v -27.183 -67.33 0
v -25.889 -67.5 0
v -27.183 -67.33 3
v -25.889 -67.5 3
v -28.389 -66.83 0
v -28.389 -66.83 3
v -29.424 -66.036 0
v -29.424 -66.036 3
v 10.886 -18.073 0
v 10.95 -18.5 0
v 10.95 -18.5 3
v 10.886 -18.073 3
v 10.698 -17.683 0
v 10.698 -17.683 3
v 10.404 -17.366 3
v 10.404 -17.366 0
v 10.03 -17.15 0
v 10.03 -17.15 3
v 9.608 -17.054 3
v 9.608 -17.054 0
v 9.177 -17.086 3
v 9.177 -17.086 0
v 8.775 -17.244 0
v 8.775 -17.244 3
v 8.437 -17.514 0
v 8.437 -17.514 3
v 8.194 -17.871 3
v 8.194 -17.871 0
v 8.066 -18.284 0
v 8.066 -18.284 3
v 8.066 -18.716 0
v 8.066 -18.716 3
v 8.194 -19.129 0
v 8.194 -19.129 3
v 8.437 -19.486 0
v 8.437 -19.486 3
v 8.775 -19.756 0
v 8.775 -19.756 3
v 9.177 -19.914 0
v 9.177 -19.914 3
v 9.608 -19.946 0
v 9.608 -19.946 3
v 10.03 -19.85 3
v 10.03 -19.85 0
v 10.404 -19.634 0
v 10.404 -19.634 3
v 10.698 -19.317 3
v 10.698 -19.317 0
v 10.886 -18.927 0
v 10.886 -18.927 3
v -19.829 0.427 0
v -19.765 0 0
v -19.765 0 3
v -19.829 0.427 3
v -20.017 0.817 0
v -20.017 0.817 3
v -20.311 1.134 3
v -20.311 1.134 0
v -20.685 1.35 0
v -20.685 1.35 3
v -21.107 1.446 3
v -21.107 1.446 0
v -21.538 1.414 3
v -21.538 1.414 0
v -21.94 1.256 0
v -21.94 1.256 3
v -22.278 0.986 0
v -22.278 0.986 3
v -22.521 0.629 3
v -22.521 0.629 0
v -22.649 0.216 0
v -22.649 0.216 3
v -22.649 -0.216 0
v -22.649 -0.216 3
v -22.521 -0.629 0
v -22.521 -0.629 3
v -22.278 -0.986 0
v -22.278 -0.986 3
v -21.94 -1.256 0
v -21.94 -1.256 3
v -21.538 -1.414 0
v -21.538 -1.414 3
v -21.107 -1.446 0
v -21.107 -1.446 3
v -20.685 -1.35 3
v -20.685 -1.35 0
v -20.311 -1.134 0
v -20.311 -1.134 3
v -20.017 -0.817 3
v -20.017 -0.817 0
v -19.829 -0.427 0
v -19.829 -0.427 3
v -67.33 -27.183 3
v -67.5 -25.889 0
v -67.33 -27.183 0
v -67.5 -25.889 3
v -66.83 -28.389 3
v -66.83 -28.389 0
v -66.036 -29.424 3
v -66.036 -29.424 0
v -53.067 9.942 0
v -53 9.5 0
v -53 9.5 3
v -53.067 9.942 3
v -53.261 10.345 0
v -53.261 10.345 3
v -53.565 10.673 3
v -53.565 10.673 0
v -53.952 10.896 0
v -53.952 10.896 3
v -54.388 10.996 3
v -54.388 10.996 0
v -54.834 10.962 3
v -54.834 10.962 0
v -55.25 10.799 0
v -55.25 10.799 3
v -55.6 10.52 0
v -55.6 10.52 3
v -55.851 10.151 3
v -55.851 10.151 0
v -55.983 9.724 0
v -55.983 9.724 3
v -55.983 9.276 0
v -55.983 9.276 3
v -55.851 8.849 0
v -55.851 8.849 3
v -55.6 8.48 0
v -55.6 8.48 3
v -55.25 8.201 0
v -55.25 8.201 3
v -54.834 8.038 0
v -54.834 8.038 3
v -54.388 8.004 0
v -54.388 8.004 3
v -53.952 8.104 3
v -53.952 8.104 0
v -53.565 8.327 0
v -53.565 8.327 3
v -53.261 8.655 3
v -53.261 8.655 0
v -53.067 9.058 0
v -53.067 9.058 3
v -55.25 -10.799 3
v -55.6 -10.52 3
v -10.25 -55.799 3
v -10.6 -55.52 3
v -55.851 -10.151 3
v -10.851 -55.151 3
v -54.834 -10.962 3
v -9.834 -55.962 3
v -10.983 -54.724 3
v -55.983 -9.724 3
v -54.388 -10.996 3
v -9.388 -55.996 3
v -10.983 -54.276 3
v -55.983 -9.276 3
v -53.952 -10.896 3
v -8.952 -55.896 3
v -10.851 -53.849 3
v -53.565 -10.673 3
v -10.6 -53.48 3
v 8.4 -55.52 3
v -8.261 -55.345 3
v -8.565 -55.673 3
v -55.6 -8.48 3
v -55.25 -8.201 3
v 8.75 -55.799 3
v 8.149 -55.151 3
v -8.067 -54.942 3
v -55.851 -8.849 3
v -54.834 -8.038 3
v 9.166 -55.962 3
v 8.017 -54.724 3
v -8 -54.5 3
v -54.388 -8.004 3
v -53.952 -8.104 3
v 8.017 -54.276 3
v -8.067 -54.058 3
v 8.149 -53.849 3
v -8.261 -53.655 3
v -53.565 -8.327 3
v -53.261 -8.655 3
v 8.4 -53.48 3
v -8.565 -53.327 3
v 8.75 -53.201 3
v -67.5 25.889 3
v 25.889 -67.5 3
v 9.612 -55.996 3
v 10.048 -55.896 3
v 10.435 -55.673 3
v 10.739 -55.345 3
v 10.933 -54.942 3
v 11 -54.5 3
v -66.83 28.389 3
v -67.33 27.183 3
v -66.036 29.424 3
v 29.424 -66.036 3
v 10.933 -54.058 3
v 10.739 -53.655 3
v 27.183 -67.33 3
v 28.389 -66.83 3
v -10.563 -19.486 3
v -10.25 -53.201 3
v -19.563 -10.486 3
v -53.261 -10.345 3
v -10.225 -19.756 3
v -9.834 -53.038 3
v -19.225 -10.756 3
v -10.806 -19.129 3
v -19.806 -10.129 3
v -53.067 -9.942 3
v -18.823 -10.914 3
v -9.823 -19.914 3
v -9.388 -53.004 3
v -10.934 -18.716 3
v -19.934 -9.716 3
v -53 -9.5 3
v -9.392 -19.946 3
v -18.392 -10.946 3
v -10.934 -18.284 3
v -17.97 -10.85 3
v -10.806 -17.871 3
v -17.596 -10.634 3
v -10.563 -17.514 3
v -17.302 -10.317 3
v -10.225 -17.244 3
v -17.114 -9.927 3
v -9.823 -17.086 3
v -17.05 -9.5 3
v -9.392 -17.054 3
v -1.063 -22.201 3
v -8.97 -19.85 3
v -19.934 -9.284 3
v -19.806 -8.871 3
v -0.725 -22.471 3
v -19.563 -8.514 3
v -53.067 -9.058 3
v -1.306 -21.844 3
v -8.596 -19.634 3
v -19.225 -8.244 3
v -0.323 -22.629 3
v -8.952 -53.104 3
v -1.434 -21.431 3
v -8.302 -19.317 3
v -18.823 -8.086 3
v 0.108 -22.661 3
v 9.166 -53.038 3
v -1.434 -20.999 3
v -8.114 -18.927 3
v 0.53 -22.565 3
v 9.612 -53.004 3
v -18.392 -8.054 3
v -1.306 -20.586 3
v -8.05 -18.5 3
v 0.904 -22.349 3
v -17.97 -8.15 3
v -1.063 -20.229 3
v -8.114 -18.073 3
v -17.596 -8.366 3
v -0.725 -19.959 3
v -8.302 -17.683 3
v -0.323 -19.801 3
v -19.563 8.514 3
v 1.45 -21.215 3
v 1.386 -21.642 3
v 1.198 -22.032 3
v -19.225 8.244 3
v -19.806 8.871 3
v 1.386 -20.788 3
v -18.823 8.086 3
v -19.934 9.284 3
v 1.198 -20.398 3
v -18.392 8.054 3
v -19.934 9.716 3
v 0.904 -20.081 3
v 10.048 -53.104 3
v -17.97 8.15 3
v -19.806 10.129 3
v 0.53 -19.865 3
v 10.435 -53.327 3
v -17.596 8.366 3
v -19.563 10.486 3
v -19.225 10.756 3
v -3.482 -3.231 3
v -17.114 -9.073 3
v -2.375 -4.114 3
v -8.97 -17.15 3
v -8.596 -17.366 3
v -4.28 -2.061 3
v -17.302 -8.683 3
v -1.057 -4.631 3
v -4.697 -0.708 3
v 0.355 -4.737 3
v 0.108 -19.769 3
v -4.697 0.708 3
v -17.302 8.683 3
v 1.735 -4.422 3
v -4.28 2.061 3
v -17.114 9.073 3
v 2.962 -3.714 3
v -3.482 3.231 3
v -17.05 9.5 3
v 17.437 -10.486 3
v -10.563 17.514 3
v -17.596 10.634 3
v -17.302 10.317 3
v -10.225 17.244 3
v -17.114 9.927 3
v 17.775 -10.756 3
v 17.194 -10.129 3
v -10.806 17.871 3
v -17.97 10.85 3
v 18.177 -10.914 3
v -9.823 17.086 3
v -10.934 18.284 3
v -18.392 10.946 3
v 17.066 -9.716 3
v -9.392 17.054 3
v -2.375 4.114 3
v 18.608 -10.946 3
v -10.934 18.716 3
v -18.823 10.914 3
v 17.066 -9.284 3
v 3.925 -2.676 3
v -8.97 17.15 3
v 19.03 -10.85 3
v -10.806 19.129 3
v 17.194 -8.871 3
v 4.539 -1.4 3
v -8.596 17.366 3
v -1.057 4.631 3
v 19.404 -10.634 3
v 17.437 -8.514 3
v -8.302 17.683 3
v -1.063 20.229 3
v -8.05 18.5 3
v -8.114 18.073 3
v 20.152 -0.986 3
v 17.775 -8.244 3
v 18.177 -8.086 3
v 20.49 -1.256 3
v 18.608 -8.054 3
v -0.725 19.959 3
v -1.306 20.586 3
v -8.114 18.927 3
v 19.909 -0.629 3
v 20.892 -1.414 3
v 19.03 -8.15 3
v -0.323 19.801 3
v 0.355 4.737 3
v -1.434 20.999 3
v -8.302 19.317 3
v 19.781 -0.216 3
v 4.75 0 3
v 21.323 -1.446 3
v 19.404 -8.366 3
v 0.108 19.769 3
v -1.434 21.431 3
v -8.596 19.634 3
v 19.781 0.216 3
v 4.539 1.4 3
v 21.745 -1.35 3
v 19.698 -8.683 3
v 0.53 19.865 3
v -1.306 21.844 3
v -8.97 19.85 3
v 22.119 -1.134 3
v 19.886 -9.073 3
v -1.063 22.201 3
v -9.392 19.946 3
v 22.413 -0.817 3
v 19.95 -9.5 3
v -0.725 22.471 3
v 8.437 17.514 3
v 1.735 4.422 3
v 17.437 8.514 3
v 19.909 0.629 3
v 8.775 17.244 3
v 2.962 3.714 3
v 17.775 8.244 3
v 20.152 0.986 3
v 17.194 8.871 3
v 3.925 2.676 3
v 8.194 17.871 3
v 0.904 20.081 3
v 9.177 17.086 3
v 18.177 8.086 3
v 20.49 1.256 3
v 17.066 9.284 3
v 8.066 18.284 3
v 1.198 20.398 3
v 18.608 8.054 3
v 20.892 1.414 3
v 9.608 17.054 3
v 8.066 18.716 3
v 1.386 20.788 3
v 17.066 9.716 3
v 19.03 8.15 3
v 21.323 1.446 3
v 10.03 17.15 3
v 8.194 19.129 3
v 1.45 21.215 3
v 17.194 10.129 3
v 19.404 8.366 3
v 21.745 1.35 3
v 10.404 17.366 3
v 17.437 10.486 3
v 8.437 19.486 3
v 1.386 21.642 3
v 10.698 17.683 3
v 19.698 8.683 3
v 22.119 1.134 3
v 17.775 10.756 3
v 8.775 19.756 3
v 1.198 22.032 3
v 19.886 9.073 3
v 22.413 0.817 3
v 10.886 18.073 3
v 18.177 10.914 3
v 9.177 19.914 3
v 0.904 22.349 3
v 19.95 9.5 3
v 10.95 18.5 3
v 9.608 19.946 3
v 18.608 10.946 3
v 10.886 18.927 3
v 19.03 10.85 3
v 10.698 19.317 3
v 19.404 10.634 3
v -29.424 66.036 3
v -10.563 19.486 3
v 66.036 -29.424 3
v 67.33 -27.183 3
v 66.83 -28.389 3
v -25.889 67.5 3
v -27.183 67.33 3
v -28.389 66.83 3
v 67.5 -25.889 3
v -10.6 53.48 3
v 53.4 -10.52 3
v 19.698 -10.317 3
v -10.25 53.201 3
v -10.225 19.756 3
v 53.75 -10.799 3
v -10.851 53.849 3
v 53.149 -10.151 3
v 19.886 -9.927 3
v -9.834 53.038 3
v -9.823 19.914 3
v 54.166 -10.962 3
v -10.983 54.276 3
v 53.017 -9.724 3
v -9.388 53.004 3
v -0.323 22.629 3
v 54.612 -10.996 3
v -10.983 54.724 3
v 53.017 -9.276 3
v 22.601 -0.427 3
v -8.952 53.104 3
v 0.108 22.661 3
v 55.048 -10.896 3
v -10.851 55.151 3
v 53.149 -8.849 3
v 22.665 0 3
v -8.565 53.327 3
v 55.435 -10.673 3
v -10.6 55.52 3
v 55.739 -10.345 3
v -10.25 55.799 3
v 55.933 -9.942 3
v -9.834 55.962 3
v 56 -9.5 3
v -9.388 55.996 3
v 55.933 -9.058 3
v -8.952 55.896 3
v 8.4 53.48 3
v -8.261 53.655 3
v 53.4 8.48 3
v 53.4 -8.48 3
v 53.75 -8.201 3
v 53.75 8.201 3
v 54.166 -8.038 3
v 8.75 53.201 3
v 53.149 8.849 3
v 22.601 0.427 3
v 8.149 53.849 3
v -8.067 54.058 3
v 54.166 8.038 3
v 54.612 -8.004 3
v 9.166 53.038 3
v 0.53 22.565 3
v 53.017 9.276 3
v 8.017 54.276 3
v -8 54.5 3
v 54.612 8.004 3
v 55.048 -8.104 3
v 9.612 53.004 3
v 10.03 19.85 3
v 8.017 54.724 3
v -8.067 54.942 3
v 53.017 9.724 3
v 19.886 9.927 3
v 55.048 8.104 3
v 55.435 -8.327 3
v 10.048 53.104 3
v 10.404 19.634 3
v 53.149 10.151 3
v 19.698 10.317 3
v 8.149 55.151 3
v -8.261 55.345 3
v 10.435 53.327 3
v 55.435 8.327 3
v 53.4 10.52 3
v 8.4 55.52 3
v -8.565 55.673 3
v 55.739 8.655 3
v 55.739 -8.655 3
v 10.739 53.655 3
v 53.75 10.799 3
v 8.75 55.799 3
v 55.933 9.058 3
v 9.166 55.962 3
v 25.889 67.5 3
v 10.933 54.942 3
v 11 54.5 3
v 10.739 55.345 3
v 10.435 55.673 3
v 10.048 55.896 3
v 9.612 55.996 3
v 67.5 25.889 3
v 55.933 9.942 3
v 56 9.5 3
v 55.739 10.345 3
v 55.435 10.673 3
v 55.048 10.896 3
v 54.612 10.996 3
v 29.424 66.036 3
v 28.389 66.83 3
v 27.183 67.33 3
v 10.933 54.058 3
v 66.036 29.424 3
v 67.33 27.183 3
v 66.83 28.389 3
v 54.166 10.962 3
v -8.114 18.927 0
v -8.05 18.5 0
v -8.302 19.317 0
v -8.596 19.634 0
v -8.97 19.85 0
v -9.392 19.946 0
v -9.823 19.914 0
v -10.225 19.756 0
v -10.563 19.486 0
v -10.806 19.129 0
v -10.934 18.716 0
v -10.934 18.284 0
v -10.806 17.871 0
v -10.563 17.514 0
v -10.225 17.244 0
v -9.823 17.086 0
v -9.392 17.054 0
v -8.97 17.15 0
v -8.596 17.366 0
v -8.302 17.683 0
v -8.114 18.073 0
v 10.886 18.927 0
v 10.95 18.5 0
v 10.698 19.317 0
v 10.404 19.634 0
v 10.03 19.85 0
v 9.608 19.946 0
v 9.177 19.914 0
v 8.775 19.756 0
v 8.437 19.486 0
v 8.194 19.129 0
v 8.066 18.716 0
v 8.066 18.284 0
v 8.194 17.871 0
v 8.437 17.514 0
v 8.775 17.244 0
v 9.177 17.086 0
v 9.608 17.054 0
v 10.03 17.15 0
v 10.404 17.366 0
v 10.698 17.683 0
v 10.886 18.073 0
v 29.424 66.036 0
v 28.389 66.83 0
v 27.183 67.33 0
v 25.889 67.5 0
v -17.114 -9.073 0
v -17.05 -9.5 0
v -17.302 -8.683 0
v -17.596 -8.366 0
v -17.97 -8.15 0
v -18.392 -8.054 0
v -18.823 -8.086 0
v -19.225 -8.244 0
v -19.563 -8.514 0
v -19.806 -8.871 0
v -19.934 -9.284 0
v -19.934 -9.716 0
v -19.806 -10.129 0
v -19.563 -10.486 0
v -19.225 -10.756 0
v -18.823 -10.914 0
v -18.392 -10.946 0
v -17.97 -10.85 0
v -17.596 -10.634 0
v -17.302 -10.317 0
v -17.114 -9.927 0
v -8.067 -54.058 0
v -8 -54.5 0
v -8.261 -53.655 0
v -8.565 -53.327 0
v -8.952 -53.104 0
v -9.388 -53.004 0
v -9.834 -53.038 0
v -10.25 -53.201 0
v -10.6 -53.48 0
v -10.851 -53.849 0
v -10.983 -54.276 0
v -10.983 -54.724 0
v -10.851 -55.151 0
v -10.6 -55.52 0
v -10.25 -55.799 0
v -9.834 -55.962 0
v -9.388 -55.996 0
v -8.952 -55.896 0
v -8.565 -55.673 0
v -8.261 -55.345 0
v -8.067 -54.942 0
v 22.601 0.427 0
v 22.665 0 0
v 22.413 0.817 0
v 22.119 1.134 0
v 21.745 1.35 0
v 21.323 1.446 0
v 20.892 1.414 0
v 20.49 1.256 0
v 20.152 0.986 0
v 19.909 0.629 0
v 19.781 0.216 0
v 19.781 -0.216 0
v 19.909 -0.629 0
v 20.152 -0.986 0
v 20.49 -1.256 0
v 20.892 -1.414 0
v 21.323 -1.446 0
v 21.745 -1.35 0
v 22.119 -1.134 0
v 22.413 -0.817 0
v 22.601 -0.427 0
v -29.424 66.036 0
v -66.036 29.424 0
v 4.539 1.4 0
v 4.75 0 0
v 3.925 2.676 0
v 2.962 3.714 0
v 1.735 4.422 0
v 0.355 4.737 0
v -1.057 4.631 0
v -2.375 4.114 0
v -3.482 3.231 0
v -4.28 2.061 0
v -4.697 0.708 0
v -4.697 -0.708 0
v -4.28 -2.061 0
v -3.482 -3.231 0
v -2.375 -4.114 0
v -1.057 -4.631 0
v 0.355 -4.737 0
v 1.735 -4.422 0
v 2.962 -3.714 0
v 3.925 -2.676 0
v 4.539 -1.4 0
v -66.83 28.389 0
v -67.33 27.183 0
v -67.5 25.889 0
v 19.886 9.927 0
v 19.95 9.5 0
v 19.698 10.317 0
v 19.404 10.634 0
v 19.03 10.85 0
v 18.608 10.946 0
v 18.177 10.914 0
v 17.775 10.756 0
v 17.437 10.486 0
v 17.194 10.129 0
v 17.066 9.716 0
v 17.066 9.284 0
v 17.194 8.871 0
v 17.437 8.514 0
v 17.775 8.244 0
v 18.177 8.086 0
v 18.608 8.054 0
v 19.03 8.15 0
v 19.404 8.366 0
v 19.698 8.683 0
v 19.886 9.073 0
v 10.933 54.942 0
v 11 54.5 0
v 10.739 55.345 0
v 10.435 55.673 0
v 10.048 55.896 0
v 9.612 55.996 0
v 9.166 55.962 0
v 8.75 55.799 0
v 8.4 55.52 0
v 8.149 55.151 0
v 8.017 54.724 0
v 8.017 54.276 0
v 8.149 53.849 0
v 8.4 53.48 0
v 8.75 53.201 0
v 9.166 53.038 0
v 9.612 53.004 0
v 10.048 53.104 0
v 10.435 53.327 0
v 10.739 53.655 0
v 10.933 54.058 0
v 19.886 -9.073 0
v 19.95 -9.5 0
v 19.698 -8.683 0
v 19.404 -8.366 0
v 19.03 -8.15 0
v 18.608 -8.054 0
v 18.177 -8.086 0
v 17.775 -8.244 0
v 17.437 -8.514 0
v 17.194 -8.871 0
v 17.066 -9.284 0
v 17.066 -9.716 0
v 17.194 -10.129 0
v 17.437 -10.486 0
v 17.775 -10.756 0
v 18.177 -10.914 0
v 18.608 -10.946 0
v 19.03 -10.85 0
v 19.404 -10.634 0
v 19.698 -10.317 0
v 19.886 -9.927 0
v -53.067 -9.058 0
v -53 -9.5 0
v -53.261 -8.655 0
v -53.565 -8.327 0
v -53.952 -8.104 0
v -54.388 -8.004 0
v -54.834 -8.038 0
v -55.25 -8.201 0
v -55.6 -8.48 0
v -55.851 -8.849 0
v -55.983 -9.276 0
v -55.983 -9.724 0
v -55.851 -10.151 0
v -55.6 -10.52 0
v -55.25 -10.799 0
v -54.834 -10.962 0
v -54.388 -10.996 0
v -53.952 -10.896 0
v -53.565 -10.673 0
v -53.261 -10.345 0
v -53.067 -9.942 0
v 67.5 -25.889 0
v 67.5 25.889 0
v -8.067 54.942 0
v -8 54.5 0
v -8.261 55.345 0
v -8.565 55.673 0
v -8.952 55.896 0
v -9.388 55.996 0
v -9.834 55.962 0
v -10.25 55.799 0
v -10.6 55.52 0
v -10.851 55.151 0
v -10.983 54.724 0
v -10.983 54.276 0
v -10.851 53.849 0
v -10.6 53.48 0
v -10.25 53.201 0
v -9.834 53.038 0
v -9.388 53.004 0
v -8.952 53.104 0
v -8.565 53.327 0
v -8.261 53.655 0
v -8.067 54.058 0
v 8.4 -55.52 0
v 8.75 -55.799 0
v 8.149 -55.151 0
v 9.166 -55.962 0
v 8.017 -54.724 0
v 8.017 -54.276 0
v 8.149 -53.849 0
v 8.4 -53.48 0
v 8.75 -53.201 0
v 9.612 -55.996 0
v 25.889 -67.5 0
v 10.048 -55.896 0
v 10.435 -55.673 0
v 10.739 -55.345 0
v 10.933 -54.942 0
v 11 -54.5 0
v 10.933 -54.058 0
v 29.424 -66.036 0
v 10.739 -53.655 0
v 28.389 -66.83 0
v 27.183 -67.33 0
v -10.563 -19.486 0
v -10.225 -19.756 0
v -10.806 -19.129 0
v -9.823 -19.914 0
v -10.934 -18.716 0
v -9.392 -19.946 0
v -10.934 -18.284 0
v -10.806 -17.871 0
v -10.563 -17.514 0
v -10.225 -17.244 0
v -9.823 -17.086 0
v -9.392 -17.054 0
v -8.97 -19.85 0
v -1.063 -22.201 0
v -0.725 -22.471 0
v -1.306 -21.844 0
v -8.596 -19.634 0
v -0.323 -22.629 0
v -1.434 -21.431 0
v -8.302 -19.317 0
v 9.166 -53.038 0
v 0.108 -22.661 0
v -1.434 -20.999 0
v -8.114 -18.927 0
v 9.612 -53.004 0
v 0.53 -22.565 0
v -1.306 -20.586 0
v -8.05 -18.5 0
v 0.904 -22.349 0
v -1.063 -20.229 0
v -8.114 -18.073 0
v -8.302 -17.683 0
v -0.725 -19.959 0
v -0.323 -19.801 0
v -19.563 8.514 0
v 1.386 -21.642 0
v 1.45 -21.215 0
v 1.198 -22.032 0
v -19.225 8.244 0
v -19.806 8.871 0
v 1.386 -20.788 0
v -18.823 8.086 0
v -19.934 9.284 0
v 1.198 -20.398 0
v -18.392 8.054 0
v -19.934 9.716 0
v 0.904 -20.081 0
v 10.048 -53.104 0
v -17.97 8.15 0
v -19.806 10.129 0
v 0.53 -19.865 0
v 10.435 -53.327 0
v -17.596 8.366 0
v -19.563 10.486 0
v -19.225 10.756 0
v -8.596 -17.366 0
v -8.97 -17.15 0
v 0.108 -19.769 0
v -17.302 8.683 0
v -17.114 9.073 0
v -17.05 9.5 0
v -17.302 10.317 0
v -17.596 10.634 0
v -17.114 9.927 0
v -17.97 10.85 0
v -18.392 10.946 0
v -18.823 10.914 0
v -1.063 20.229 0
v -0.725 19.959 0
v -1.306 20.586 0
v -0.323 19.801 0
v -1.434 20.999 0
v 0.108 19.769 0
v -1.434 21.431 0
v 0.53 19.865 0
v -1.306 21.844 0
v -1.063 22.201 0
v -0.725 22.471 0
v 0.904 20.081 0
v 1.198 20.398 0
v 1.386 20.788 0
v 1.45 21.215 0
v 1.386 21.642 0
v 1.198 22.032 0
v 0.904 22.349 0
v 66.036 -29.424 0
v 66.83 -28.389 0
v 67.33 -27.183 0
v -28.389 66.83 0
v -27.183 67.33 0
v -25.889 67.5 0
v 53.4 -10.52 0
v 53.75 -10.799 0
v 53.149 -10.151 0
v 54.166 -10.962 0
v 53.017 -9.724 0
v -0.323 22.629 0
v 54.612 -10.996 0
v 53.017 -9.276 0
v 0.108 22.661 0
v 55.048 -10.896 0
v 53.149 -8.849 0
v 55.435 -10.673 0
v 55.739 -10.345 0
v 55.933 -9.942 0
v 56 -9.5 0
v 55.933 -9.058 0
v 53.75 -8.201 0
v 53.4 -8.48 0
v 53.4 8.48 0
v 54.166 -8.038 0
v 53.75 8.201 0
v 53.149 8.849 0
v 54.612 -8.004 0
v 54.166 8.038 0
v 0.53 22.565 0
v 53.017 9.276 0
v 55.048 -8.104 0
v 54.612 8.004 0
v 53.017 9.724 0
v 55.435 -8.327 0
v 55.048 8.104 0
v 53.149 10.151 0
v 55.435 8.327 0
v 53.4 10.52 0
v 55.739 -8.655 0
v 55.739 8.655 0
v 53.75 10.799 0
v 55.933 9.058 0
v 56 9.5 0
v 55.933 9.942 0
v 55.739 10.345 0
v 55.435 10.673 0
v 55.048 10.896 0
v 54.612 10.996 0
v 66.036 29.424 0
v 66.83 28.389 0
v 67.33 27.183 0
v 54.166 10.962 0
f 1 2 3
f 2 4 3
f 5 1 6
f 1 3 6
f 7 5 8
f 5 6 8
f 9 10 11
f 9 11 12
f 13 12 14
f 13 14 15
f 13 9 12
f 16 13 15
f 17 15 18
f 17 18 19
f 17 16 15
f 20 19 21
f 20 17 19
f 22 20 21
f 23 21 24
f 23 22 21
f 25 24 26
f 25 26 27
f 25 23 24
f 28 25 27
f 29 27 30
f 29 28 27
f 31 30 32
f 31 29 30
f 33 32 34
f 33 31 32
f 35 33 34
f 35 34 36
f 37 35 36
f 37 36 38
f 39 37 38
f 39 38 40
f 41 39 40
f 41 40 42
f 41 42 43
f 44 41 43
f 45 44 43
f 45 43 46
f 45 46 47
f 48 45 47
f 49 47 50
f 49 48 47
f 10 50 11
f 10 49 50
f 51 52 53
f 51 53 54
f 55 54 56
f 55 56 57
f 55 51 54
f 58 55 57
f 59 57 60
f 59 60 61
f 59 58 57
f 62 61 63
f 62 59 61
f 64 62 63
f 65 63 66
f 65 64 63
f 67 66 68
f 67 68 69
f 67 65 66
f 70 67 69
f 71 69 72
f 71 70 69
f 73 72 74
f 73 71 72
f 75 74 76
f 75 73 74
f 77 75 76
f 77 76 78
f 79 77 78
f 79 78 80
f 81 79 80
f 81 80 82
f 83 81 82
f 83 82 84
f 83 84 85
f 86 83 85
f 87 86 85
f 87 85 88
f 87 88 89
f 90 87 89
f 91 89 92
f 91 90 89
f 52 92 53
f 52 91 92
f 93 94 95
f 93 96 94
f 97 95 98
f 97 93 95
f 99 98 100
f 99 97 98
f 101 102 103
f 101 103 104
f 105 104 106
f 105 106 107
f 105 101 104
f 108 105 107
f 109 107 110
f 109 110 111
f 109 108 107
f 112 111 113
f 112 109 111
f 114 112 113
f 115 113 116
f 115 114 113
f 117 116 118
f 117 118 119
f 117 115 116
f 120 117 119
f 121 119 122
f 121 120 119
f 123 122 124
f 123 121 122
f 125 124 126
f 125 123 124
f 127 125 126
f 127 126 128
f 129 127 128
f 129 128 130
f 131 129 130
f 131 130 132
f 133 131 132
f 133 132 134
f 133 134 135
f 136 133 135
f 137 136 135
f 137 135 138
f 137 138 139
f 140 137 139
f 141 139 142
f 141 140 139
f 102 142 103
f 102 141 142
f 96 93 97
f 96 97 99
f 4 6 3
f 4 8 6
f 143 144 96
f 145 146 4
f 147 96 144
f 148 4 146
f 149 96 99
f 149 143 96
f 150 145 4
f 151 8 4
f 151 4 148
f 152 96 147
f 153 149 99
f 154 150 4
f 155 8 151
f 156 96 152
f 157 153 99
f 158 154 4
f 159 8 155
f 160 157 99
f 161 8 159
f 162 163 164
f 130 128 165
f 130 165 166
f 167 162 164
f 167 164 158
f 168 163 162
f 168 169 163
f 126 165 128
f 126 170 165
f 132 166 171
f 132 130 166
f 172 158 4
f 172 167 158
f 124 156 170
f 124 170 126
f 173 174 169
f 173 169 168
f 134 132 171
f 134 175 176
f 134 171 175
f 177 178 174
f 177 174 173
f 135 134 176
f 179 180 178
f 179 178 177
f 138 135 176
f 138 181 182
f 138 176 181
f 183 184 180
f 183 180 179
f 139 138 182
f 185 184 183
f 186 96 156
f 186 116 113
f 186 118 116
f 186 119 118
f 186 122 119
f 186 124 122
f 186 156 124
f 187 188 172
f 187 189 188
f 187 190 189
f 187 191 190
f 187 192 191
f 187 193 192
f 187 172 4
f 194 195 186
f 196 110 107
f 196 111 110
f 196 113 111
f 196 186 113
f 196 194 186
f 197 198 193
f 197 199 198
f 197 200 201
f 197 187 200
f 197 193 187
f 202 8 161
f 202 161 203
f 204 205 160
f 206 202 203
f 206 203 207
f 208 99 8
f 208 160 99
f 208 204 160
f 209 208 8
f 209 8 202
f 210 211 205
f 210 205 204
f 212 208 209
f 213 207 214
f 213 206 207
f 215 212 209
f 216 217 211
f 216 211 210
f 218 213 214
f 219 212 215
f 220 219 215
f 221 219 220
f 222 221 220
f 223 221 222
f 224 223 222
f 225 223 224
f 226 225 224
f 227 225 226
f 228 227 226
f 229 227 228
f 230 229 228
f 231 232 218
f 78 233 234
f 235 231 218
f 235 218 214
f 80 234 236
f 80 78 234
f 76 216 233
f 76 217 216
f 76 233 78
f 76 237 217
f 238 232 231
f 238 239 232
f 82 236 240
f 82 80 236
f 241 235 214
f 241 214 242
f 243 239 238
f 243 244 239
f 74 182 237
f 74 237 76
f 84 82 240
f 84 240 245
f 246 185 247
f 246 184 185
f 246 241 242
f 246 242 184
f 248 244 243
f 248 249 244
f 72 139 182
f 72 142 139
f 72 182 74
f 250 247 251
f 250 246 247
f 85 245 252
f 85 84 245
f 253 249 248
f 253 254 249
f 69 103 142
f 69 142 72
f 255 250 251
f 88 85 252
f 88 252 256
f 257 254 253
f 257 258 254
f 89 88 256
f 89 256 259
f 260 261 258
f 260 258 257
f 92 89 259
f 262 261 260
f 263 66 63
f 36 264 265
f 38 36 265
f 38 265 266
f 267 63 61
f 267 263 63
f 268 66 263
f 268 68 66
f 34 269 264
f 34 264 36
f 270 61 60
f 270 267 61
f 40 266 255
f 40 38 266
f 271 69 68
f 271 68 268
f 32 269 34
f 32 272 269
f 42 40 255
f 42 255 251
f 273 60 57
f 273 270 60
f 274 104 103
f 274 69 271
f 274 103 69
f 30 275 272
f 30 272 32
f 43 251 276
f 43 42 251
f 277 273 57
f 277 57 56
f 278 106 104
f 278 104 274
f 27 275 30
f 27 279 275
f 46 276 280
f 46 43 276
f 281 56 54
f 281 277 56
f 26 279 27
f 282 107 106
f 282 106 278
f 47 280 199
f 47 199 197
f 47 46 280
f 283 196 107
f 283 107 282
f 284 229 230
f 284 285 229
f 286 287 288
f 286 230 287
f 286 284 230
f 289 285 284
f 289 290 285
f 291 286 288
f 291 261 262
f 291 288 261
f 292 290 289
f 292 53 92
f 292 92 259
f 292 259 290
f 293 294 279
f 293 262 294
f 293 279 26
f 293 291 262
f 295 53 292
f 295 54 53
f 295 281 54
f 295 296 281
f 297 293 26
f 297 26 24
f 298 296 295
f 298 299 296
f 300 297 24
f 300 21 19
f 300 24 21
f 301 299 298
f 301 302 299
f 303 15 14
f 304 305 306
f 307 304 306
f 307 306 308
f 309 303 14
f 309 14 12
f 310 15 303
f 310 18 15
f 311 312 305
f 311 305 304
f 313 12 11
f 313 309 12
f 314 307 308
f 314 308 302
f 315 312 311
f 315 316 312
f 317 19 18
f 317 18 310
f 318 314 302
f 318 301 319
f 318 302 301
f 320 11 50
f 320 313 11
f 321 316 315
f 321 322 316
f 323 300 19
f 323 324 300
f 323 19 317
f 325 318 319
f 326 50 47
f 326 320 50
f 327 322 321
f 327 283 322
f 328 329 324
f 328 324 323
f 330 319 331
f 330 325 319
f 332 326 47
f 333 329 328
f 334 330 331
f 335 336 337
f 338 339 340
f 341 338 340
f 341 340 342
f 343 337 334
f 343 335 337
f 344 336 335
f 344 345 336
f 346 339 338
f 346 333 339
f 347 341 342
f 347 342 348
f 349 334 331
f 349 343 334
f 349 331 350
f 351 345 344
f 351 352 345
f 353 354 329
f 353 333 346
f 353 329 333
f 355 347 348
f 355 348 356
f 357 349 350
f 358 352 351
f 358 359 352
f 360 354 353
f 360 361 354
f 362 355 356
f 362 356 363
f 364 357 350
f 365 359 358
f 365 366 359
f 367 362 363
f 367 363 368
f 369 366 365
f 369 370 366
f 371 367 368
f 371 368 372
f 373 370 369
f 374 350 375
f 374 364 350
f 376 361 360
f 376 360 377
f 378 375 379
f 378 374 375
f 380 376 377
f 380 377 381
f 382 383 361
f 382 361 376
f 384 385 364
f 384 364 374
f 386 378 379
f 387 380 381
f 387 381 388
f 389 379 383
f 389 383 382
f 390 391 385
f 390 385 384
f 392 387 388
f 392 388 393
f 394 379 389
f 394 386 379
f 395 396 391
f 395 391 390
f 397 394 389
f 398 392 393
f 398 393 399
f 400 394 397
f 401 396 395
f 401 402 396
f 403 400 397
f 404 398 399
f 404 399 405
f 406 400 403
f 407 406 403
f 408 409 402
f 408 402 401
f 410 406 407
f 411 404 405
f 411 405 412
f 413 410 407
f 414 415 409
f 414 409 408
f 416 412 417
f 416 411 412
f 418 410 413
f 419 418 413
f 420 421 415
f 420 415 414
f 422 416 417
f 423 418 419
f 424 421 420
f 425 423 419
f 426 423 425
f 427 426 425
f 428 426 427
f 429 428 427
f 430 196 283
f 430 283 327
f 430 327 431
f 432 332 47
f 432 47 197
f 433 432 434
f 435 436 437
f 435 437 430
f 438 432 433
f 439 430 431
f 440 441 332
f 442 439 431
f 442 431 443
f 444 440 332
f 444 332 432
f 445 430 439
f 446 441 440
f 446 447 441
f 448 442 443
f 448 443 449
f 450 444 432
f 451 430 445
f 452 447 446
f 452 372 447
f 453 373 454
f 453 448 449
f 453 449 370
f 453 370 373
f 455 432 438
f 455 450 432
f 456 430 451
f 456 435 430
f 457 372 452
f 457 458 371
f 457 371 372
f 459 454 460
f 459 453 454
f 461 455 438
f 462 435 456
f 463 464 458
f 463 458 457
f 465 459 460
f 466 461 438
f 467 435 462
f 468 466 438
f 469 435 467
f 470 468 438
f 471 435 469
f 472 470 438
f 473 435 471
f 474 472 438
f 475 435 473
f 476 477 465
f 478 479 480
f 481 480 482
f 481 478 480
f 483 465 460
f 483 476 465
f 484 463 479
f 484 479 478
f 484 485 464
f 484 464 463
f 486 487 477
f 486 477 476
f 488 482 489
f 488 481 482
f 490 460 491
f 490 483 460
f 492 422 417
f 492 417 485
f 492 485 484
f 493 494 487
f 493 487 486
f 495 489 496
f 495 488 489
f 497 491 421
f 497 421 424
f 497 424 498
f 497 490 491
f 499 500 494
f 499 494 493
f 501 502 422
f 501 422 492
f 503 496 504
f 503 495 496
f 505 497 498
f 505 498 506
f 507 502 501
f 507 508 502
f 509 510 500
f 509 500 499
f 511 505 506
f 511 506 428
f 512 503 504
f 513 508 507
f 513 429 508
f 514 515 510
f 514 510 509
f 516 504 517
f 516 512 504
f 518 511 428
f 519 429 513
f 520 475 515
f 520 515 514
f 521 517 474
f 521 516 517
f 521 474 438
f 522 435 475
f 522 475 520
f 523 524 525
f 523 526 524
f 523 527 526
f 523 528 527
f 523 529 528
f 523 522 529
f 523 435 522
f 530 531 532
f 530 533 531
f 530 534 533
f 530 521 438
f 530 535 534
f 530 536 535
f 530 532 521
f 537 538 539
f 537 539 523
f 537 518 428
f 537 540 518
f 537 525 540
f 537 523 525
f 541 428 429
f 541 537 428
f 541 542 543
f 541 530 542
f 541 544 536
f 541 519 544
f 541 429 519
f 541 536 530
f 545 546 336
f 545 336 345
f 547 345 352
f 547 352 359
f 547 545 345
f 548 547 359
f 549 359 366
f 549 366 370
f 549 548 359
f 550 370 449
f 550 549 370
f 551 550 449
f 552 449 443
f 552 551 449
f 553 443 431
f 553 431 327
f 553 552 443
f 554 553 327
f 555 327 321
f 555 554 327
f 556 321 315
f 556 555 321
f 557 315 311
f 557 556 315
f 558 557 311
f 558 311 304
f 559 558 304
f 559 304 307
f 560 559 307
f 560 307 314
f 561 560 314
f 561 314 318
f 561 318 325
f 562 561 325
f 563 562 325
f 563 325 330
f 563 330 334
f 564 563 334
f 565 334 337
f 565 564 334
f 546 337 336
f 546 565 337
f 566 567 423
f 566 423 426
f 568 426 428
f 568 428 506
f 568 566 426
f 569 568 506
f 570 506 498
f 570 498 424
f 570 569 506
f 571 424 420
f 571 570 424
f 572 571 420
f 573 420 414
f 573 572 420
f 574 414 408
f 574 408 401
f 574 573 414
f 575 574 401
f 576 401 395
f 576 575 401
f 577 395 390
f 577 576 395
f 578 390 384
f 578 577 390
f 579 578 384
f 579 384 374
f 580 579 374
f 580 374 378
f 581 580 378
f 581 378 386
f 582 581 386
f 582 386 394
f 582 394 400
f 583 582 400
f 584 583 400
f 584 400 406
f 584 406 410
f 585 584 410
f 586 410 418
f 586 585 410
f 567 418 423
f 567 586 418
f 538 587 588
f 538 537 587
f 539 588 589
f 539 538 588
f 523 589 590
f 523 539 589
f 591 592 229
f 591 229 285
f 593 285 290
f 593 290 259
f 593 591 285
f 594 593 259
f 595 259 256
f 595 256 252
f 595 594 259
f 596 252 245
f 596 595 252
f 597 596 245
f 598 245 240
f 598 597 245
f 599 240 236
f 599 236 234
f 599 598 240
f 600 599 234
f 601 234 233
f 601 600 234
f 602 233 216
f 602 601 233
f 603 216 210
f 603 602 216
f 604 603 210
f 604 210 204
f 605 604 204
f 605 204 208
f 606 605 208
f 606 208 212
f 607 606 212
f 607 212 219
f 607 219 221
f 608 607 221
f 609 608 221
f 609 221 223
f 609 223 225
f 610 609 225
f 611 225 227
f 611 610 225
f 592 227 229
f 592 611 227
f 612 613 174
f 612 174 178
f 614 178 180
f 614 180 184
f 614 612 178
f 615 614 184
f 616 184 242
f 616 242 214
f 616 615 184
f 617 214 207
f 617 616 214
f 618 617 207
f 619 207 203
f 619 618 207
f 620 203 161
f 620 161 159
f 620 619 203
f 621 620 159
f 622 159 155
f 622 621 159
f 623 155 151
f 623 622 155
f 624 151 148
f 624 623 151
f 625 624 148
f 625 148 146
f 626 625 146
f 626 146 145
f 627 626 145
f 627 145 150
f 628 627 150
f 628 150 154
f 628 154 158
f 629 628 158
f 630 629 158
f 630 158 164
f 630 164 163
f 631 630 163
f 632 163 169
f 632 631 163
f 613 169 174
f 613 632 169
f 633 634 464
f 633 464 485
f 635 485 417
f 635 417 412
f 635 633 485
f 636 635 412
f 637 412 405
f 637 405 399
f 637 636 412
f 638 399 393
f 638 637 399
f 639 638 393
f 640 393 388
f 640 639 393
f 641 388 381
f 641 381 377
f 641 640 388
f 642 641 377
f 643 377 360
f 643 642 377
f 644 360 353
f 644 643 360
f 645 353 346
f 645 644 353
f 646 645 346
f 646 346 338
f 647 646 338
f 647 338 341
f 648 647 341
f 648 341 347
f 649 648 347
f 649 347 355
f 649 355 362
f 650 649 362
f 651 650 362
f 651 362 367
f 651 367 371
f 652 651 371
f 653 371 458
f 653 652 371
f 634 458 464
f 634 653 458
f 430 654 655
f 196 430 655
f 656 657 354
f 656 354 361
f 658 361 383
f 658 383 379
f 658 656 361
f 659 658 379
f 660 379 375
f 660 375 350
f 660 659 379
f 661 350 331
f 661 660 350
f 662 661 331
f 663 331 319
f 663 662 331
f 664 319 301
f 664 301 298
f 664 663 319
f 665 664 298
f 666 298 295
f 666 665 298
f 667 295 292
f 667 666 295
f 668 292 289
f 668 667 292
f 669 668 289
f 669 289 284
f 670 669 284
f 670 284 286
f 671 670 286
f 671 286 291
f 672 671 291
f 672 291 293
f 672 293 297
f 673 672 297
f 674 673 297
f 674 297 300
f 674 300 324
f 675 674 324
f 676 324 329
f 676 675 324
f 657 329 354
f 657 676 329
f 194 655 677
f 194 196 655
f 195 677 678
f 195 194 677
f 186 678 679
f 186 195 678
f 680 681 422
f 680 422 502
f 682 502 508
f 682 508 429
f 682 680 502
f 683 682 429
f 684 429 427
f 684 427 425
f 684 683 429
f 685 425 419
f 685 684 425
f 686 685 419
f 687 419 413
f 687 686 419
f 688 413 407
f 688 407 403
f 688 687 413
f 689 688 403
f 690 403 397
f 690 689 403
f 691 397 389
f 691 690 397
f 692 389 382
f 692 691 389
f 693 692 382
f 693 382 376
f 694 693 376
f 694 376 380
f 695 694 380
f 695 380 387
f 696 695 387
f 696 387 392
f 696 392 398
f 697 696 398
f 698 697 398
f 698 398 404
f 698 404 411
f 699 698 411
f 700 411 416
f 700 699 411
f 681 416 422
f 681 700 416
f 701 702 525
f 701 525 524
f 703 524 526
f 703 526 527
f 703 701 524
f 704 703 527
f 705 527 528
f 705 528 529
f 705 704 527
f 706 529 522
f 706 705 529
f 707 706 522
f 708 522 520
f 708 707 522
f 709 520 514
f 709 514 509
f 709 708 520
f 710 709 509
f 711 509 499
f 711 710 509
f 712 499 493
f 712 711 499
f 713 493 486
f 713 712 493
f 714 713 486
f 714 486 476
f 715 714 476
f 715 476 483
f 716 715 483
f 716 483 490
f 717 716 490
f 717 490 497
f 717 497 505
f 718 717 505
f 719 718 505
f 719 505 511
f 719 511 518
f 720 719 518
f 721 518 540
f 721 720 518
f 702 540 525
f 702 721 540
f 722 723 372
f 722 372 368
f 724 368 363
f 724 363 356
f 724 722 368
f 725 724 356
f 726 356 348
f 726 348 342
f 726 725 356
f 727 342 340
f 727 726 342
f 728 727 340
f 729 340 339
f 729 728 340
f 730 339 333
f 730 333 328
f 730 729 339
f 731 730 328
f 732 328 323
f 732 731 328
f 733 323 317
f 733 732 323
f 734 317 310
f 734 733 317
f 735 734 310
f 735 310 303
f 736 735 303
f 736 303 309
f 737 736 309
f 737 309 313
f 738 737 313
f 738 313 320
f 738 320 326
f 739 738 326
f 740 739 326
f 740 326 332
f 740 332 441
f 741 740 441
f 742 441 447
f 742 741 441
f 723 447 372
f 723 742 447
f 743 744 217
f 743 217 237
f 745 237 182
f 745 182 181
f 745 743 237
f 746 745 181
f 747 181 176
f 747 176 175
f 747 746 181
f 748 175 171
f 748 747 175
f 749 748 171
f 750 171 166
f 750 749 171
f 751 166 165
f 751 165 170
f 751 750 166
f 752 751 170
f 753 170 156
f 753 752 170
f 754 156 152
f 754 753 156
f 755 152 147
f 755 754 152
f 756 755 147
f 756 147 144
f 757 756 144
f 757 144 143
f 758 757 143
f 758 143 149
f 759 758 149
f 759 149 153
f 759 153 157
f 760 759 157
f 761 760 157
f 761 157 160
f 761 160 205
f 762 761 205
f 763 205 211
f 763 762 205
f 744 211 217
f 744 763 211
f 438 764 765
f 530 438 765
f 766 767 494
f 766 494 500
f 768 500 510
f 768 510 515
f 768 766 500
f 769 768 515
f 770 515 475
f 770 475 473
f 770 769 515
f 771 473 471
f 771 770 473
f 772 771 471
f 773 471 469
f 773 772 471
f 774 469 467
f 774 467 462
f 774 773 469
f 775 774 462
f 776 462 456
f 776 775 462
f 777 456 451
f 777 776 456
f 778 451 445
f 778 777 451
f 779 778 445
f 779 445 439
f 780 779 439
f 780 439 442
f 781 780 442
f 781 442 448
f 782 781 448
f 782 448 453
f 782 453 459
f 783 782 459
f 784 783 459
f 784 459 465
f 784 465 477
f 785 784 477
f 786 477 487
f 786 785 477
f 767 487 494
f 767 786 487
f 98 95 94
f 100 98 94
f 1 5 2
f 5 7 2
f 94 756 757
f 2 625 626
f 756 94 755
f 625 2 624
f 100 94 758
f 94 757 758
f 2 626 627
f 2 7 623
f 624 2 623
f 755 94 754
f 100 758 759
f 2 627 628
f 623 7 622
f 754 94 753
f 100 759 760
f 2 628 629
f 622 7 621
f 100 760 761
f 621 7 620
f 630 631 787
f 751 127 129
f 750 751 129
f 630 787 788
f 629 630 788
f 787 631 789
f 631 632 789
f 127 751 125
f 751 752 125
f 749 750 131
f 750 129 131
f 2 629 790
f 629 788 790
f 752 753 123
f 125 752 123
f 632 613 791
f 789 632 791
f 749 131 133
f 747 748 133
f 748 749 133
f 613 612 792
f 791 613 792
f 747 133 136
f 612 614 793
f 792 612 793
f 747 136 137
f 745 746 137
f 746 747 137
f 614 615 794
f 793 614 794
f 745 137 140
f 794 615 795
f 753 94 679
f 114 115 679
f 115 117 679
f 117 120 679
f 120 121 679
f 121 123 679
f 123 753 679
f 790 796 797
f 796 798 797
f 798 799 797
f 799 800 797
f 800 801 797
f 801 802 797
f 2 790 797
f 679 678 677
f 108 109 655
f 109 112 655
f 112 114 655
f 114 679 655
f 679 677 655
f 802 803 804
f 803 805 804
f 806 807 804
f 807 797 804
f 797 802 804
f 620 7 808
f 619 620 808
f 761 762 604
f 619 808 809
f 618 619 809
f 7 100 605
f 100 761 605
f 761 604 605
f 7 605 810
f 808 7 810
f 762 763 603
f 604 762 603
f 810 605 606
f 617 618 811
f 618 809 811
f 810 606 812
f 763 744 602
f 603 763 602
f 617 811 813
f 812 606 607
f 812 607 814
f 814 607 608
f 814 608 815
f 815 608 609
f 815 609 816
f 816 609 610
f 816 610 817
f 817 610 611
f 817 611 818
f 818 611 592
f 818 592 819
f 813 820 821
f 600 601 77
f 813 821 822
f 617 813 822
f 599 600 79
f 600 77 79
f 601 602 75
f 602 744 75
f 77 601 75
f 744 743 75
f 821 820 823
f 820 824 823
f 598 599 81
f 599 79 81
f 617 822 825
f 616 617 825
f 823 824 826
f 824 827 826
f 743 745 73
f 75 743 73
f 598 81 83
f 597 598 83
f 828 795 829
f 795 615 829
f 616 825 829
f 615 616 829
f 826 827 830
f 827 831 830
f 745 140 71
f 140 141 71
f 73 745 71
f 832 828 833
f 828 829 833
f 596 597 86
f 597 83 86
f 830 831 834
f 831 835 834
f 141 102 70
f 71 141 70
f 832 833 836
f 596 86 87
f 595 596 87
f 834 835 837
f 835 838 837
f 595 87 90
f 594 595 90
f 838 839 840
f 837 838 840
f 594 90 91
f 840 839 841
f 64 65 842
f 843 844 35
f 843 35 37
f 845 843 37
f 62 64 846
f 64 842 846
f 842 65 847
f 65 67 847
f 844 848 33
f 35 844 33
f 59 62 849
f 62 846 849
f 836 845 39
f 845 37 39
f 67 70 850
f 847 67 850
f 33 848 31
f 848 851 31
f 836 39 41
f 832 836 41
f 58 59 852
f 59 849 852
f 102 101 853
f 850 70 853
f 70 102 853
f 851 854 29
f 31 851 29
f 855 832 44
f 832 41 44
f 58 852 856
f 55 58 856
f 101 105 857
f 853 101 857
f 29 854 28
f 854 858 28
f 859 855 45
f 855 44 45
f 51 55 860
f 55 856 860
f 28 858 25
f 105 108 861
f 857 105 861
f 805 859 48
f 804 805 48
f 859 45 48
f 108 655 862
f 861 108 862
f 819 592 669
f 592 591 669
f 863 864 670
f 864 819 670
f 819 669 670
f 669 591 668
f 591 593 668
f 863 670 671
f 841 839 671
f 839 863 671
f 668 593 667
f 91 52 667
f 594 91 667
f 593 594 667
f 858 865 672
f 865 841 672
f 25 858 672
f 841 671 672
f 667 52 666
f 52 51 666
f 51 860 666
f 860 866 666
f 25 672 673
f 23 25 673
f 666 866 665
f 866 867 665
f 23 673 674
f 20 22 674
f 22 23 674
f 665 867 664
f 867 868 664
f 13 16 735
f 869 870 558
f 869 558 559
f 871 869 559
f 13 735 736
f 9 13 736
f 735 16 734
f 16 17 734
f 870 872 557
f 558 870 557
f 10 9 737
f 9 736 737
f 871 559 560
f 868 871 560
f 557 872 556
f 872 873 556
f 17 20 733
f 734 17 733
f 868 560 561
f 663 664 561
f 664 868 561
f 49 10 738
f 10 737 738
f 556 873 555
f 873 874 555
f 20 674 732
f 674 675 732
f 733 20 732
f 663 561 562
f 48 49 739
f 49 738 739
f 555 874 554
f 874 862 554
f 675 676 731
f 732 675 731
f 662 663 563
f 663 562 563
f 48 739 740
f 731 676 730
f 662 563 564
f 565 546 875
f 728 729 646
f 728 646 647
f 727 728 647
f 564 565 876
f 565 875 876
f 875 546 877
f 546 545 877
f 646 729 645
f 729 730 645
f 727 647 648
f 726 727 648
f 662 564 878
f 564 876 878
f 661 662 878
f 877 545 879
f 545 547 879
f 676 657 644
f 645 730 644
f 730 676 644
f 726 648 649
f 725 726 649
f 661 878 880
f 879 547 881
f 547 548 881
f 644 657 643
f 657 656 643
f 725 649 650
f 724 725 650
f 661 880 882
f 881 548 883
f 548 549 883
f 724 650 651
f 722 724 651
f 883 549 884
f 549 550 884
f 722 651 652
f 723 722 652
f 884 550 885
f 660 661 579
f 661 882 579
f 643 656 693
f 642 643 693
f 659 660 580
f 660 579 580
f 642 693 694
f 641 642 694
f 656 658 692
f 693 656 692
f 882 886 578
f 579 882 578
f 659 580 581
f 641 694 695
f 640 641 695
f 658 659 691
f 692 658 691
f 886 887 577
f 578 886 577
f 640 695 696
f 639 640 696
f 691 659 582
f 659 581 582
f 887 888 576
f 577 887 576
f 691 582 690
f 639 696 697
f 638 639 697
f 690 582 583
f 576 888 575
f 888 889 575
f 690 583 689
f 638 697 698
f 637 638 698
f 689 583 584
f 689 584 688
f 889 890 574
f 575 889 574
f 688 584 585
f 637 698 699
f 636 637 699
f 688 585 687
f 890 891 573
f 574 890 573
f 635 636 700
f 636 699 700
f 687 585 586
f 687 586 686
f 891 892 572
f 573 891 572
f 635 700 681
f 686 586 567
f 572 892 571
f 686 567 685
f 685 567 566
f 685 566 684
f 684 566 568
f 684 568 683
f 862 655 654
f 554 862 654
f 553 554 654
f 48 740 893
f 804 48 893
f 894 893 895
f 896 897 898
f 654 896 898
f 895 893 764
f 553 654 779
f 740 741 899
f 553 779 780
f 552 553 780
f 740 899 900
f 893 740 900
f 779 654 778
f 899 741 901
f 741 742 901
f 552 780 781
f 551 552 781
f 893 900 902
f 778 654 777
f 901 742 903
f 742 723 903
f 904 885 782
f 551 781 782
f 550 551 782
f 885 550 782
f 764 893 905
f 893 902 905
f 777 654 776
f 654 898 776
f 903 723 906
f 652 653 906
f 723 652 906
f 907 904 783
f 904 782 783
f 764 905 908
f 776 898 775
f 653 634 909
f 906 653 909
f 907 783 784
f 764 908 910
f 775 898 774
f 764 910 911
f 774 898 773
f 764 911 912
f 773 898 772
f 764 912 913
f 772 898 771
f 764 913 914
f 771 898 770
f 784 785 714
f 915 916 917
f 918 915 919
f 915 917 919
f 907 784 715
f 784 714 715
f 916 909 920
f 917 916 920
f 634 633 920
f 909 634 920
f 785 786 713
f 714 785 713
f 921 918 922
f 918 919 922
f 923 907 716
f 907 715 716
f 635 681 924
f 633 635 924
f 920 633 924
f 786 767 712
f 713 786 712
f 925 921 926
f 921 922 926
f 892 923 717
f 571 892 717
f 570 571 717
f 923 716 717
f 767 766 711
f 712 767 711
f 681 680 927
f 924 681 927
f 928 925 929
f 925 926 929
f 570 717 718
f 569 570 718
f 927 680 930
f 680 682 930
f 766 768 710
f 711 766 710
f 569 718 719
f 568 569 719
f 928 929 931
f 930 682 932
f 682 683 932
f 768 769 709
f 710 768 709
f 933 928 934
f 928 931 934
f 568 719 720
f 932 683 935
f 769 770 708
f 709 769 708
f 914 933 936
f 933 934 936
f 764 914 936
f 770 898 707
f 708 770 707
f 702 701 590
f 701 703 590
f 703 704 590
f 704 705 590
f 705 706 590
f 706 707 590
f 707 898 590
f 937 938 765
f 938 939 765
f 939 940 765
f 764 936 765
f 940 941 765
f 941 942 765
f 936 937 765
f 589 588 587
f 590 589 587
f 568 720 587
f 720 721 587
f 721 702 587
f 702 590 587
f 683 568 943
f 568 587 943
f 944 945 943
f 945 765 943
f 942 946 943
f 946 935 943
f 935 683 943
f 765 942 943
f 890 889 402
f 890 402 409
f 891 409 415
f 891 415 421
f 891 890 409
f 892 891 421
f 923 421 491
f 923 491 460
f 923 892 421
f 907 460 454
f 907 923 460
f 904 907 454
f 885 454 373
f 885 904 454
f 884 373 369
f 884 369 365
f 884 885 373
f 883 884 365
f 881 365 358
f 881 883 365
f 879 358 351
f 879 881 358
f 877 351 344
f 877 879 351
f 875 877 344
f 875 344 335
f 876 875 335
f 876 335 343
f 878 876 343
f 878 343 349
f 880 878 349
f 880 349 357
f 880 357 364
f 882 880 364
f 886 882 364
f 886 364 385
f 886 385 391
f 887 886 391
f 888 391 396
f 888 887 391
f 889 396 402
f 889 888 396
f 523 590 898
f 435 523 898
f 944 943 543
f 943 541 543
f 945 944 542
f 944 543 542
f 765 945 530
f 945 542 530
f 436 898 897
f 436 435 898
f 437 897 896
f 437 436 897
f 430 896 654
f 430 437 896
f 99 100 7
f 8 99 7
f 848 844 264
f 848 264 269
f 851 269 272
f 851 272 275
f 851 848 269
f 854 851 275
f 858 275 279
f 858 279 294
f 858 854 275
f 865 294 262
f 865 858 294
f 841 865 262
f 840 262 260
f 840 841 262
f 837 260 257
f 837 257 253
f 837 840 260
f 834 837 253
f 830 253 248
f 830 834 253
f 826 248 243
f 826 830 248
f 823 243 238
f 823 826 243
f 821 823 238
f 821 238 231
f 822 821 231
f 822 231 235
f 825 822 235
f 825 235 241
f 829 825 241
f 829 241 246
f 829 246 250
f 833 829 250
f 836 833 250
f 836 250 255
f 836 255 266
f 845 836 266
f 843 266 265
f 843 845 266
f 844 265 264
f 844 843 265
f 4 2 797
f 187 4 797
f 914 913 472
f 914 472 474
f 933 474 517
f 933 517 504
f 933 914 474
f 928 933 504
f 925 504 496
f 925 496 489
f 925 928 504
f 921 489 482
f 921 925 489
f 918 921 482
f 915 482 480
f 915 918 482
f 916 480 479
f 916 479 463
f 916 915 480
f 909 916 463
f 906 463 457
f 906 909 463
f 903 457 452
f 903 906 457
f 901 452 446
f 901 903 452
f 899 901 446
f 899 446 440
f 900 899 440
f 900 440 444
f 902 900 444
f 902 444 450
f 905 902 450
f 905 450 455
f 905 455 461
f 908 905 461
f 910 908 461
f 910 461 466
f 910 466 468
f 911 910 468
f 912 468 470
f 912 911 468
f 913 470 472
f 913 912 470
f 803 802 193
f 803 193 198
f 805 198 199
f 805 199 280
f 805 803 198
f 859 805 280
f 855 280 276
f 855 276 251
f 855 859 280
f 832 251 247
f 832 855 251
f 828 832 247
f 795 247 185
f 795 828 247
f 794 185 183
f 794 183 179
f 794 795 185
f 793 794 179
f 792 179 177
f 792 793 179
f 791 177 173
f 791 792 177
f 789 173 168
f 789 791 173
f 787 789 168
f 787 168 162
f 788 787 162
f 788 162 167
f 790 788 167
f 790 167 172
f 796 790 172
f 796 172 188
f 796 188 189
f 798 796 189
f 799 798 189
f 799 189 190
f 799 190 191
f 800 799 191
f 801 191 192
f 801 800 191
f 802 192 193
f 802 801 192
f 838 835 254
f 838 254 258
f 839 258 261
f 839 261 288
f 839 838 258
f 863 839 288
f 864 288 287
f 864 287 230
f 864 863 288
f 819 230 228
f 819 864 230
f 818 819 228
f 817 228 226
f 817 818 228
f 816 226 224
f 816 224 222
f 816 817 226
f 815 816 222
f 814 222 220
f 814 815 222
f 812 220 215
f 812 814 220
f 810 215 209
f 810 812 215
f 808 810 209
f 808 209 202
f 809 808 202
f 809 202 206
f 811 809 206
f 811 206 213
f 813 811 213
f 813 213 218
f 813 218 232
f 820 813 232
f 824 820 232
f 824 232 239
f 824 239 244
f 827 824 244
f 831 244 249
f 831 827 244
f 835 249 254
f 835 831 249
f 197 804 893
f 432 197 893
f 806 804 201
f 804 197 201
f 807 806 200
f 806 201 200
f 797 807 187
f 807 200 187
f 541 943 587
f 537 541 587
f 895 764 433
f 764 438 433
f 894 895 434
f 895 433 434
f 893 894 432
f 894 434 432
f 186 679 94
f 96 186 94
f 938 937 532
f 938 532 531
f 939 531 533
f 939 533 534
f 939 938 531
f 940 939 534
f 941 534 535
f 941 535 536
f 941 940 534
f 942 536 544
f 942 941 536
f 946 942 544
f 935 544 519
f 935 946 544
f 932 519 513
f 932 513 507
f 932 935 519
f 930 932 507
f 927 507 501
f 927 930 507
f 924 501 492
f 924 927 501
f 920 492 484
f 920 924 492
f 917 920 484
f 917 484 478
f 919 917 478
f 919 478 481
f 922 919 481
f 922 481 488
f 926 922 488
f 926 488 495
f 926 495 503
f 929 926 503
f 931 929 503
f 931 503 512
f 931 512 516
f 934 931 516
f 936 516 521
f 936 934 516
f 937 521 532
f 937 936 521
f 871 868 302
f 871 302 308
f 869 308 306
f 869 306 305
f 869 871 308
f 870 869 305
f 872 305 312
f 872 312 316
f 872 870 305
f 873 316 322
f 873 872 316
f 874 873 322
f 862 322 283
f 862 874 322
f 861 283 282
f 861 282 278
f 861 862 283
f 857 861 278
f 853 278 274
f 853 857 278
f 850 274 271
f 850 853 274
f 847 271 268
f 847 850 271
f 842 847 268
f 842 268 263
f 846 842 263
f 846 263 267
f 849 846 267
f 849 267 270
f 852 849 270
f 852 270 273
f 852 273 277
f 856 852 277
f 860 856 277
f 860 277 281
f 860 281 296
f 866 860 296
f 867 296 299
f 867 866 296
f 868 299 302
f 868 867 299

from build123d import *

# Parameters (mm, degrees)
F0_R     = 1.5
F0_R_2   = 1.45
F0_R_3   = 4.75
F1_DEPTH = 3
F2_R     = 5


with BuildPart() as f1:
    # F0 (on Top) → F1 (new body)
    with BuildSketch(Plane.XY):
        Polygon((67.5, 27.96), (27.96, 67.5), (-27.96, 67.5), (-67.5, 27.96), (-67.5, -27.96), (-27.96, -67.5), (27.96, -67.5), (67.5, -27.96), align=None)
        with Locations((-9.5, -54.5)):
            Circle(F0_R, mode=Mode.SUBTRACT)
        with Locations((-54.5, -9.5)):
            Circle(F0_R, mode=Mode.SUBTRACT)
        with Locations((-9.5, -18.5)):
            Circle(F0_R_2, mode=Mode.SUBTRACT)
        with Locations((-18.5, -9.5)):
            Circle(F0_R_2, mode=Mode.SUBTRACT)
        with Locations((9.5, -54.5)):
            Circle(F0_R, mode=Mode.SUBTRACT)
        with Locations((0, -21.215)):
            Circle(F0_R_2, mode=Mode.SUBTRACT)
        with Locations((9.5, -18.5)):
            Circle(F0_R_2, mode=Mode.SUBTRACT)
        with Locations((18.5, -9.5)):
            Circle(F0_R_2, mode=Mode.SUBTRACT)
        with Locations((54.5, -9.5)):
            Circle(F0_R, mode=Mode.SUBTRACT)
        with Locations((-54.5, 9.5)):
            Circle(F0_R, mode=Mode.SUBTRACT)
        with Locations((-21.215, 0)):
            Circle(F0_R_2, mode=Mode.SUBTRACT)
        with Locations((-18.5, 9.5)):
            Circle(F0_R_2, mode=Mode.SUBTRACT)
        with Locations((-9.5, 18.5)):
            Circle(F0_R_2, mode=Mode.SUBTRACT)
        with Locations((-9.5, 54.5)):
            Circle(F0_R, mode=Mode.SUBTRACT)
        Circle(F0_R_3, mode=Mode.SUBTRACT)
        with Locations((21.215, 0)):
            Circle(F0_R_2, mode=Mode.SUBTRACT)
        with Locations((18.5, 9.5)):
            Circle(F0_R_2, mode=Mode.SUBTRACT)
        with Locations((0, 21.215)):
            Circle(F0_R_2, mode=Mode.SUBTRACT)
        with Locations((9.5, 18.5)):
            Circle(F0_R_2, mode=Mode.SUBTRACT)
        with Locations((54.5, 9.5)):
            Circle(F0_R, mode=Mode.SUBTRACT)
        with Locations((9.5, 54.5)):
            Circle(F0_R, mode=Mode.SUBTRACT)
    extrude(amount=F1_DEPTH)

    # F2
    f2_edges = [f1.edges().sort_by_distance(p)[0] for p in [
        (-27.96, 67.5, 1.5),
        (-67.5, 27.96, 1.5),
        (-67.5, -27.96, 1.5),
        (-27.96, -67.5, 1.5),
        (27.96, -67.5, 1.5),
        (67.5, -27.96, 1.5),
        (67.5, 27.96, 1.5),
        (27.96, 67.5, 1.5),
    ]]
    fillet(f2_edges, radius=F2_R)


solid = f1.part
